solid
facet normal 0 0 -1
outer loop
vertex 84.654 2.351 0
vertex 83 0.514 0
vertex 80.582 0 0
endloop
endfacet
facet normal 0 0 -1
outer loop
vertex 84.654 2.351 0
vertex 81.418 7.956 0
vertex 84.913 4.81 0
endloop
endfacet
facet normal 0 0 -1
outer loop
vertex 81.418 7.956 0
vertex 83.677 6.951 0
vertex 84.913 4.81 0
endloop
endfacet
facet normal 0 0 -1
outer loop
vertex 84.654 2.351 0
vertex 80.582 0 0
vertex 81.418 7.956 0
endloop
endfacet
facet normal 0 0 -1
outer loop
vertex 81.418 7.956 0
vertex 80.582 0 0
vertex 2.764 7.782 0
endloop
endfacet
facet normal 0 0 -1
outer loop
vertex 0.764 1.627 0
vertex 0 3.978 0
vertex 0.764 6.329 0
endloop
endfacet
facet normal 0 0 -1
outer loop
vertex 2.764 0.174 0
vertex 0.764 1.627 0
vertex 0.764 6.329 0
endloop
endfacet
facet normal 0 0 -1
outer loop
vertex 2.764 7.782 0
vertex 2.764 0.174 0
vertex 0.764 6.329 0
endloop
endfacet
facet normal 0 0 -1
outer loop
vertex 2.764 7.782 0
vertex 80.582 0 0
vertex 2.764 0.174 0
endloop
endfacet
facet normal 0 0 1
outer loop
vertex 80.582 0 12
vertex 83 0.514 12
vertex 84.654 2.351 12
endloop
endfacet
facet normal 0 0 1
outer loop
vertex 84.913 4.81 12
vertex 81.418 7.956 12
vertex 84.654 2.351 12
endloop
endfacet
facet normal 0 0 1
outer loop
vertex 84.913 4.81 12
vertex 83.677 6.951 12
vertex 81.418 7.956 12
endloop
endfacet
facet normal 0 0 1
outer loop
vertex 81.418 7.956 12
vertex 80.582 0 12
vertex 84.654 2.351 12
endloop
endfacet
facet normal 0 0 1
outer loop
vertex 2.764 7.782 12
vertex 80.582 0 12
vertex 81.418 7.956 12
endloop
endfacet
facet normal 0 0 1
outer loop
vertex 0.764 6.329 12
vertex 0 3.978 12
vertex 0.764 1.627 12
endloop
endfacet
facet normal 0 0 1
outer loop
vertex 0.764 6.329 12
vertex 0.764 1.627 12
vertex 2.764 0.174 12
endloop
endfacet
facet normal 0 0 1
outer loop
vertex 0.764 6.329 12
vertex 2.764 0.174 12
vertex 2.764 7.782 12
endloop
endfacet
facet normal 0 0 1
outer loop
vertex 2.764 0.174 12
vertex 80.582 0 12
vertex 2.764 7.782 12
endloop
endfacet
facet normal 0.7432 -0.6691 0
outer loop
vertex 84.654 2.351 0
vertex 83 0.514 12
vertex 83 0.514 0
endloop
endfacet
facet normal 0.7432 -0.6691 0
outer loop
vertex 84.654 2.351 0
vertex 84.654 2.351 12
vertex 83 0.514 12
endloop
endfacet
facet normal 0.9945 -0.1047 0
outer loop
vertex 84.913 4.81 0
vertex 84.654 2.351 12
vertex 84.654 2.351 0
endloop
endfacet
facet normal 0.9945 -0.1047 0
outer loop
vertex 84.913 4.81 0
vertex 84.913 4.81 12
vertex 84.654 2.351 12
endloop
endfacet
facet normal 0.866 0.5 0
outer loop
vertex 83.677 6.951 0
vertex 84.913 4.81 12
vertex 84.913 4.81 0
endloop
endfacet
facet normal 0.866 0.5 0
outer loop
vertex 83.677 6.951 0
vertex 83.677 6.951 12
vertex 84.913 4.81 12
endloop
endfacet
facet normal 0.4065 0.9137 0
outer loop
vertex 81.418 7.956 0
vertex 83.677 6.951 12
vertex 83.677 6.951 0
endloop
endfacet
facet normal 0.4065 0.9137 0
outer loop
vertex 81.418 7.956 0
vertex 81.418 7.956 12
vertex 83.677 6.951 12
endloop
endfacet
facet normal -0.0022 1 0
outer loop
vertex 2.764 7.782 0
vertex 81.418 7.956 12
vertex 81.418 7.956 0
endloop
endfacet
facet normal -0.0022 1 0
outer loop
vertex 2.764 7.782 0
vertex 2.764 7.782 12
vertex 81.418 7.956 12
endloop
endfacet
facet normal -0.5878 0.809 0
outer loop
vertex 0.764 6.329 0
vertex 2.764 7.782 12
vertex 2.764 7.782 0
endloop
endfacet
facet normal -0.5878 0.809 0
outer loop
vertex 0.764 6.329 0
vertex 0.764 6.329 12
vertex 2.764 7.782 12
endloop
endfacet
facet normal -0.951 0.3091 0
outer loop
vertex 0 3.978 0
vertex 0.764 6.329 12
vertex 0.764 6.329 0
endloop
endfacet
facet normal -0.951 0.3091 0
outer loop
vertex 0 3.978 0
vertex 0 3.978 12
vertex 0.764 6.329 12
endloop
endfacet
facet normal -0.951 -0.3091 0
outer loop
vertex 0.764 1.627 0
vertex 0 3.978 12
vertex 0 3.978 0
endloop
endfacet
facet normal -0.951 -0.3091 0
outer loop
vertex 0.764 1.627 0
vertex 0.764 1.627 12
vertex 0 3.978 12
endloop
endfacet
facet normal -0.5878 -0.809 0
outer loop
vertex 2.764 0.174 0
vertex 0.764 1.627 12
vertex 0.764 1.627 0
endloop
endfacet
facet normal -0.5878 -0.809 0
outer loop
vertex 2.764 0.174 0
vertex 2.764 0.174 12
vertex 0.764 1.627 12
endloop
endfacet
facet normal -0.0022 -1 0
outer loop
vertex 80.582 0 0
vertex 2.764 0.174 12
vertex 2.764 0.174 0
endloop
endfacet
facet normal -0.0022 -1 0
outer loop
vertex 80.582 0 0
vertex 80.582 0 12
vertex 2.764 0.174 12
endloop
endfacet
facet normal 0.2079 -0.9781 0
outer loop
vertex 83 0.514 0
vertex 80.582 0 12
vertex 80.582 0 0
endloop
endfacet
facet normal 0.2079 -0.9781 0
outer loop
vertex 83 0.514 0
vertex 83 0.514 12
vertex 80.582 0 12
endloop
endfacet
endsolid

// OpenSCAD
$fn = 32;

// ----------------------------------------------------------------------
// Key bar: parallel key, 12 mm thick
// ----------------------------------------------------------------------

// --- parameters (mm) ---
profile_height = 12;      // extrusion height
profile_points = 11;      // points of the closed outline

profile = [[0, 3.978], [0.764, 1.627], [2.764, 0.174], [80.582, 0], [83, 0.514], [84.654, 2.351], [84.913, 4.81], [83.677, 6.951], [81.418, 7.956], [2.764, 7.782], [0.764, 6.329]];  // single closed polygon, 11 points, counter clockwise

// --- the one profile operation ---
linear_extrude(height = profile_height) polygon(points = profile);
